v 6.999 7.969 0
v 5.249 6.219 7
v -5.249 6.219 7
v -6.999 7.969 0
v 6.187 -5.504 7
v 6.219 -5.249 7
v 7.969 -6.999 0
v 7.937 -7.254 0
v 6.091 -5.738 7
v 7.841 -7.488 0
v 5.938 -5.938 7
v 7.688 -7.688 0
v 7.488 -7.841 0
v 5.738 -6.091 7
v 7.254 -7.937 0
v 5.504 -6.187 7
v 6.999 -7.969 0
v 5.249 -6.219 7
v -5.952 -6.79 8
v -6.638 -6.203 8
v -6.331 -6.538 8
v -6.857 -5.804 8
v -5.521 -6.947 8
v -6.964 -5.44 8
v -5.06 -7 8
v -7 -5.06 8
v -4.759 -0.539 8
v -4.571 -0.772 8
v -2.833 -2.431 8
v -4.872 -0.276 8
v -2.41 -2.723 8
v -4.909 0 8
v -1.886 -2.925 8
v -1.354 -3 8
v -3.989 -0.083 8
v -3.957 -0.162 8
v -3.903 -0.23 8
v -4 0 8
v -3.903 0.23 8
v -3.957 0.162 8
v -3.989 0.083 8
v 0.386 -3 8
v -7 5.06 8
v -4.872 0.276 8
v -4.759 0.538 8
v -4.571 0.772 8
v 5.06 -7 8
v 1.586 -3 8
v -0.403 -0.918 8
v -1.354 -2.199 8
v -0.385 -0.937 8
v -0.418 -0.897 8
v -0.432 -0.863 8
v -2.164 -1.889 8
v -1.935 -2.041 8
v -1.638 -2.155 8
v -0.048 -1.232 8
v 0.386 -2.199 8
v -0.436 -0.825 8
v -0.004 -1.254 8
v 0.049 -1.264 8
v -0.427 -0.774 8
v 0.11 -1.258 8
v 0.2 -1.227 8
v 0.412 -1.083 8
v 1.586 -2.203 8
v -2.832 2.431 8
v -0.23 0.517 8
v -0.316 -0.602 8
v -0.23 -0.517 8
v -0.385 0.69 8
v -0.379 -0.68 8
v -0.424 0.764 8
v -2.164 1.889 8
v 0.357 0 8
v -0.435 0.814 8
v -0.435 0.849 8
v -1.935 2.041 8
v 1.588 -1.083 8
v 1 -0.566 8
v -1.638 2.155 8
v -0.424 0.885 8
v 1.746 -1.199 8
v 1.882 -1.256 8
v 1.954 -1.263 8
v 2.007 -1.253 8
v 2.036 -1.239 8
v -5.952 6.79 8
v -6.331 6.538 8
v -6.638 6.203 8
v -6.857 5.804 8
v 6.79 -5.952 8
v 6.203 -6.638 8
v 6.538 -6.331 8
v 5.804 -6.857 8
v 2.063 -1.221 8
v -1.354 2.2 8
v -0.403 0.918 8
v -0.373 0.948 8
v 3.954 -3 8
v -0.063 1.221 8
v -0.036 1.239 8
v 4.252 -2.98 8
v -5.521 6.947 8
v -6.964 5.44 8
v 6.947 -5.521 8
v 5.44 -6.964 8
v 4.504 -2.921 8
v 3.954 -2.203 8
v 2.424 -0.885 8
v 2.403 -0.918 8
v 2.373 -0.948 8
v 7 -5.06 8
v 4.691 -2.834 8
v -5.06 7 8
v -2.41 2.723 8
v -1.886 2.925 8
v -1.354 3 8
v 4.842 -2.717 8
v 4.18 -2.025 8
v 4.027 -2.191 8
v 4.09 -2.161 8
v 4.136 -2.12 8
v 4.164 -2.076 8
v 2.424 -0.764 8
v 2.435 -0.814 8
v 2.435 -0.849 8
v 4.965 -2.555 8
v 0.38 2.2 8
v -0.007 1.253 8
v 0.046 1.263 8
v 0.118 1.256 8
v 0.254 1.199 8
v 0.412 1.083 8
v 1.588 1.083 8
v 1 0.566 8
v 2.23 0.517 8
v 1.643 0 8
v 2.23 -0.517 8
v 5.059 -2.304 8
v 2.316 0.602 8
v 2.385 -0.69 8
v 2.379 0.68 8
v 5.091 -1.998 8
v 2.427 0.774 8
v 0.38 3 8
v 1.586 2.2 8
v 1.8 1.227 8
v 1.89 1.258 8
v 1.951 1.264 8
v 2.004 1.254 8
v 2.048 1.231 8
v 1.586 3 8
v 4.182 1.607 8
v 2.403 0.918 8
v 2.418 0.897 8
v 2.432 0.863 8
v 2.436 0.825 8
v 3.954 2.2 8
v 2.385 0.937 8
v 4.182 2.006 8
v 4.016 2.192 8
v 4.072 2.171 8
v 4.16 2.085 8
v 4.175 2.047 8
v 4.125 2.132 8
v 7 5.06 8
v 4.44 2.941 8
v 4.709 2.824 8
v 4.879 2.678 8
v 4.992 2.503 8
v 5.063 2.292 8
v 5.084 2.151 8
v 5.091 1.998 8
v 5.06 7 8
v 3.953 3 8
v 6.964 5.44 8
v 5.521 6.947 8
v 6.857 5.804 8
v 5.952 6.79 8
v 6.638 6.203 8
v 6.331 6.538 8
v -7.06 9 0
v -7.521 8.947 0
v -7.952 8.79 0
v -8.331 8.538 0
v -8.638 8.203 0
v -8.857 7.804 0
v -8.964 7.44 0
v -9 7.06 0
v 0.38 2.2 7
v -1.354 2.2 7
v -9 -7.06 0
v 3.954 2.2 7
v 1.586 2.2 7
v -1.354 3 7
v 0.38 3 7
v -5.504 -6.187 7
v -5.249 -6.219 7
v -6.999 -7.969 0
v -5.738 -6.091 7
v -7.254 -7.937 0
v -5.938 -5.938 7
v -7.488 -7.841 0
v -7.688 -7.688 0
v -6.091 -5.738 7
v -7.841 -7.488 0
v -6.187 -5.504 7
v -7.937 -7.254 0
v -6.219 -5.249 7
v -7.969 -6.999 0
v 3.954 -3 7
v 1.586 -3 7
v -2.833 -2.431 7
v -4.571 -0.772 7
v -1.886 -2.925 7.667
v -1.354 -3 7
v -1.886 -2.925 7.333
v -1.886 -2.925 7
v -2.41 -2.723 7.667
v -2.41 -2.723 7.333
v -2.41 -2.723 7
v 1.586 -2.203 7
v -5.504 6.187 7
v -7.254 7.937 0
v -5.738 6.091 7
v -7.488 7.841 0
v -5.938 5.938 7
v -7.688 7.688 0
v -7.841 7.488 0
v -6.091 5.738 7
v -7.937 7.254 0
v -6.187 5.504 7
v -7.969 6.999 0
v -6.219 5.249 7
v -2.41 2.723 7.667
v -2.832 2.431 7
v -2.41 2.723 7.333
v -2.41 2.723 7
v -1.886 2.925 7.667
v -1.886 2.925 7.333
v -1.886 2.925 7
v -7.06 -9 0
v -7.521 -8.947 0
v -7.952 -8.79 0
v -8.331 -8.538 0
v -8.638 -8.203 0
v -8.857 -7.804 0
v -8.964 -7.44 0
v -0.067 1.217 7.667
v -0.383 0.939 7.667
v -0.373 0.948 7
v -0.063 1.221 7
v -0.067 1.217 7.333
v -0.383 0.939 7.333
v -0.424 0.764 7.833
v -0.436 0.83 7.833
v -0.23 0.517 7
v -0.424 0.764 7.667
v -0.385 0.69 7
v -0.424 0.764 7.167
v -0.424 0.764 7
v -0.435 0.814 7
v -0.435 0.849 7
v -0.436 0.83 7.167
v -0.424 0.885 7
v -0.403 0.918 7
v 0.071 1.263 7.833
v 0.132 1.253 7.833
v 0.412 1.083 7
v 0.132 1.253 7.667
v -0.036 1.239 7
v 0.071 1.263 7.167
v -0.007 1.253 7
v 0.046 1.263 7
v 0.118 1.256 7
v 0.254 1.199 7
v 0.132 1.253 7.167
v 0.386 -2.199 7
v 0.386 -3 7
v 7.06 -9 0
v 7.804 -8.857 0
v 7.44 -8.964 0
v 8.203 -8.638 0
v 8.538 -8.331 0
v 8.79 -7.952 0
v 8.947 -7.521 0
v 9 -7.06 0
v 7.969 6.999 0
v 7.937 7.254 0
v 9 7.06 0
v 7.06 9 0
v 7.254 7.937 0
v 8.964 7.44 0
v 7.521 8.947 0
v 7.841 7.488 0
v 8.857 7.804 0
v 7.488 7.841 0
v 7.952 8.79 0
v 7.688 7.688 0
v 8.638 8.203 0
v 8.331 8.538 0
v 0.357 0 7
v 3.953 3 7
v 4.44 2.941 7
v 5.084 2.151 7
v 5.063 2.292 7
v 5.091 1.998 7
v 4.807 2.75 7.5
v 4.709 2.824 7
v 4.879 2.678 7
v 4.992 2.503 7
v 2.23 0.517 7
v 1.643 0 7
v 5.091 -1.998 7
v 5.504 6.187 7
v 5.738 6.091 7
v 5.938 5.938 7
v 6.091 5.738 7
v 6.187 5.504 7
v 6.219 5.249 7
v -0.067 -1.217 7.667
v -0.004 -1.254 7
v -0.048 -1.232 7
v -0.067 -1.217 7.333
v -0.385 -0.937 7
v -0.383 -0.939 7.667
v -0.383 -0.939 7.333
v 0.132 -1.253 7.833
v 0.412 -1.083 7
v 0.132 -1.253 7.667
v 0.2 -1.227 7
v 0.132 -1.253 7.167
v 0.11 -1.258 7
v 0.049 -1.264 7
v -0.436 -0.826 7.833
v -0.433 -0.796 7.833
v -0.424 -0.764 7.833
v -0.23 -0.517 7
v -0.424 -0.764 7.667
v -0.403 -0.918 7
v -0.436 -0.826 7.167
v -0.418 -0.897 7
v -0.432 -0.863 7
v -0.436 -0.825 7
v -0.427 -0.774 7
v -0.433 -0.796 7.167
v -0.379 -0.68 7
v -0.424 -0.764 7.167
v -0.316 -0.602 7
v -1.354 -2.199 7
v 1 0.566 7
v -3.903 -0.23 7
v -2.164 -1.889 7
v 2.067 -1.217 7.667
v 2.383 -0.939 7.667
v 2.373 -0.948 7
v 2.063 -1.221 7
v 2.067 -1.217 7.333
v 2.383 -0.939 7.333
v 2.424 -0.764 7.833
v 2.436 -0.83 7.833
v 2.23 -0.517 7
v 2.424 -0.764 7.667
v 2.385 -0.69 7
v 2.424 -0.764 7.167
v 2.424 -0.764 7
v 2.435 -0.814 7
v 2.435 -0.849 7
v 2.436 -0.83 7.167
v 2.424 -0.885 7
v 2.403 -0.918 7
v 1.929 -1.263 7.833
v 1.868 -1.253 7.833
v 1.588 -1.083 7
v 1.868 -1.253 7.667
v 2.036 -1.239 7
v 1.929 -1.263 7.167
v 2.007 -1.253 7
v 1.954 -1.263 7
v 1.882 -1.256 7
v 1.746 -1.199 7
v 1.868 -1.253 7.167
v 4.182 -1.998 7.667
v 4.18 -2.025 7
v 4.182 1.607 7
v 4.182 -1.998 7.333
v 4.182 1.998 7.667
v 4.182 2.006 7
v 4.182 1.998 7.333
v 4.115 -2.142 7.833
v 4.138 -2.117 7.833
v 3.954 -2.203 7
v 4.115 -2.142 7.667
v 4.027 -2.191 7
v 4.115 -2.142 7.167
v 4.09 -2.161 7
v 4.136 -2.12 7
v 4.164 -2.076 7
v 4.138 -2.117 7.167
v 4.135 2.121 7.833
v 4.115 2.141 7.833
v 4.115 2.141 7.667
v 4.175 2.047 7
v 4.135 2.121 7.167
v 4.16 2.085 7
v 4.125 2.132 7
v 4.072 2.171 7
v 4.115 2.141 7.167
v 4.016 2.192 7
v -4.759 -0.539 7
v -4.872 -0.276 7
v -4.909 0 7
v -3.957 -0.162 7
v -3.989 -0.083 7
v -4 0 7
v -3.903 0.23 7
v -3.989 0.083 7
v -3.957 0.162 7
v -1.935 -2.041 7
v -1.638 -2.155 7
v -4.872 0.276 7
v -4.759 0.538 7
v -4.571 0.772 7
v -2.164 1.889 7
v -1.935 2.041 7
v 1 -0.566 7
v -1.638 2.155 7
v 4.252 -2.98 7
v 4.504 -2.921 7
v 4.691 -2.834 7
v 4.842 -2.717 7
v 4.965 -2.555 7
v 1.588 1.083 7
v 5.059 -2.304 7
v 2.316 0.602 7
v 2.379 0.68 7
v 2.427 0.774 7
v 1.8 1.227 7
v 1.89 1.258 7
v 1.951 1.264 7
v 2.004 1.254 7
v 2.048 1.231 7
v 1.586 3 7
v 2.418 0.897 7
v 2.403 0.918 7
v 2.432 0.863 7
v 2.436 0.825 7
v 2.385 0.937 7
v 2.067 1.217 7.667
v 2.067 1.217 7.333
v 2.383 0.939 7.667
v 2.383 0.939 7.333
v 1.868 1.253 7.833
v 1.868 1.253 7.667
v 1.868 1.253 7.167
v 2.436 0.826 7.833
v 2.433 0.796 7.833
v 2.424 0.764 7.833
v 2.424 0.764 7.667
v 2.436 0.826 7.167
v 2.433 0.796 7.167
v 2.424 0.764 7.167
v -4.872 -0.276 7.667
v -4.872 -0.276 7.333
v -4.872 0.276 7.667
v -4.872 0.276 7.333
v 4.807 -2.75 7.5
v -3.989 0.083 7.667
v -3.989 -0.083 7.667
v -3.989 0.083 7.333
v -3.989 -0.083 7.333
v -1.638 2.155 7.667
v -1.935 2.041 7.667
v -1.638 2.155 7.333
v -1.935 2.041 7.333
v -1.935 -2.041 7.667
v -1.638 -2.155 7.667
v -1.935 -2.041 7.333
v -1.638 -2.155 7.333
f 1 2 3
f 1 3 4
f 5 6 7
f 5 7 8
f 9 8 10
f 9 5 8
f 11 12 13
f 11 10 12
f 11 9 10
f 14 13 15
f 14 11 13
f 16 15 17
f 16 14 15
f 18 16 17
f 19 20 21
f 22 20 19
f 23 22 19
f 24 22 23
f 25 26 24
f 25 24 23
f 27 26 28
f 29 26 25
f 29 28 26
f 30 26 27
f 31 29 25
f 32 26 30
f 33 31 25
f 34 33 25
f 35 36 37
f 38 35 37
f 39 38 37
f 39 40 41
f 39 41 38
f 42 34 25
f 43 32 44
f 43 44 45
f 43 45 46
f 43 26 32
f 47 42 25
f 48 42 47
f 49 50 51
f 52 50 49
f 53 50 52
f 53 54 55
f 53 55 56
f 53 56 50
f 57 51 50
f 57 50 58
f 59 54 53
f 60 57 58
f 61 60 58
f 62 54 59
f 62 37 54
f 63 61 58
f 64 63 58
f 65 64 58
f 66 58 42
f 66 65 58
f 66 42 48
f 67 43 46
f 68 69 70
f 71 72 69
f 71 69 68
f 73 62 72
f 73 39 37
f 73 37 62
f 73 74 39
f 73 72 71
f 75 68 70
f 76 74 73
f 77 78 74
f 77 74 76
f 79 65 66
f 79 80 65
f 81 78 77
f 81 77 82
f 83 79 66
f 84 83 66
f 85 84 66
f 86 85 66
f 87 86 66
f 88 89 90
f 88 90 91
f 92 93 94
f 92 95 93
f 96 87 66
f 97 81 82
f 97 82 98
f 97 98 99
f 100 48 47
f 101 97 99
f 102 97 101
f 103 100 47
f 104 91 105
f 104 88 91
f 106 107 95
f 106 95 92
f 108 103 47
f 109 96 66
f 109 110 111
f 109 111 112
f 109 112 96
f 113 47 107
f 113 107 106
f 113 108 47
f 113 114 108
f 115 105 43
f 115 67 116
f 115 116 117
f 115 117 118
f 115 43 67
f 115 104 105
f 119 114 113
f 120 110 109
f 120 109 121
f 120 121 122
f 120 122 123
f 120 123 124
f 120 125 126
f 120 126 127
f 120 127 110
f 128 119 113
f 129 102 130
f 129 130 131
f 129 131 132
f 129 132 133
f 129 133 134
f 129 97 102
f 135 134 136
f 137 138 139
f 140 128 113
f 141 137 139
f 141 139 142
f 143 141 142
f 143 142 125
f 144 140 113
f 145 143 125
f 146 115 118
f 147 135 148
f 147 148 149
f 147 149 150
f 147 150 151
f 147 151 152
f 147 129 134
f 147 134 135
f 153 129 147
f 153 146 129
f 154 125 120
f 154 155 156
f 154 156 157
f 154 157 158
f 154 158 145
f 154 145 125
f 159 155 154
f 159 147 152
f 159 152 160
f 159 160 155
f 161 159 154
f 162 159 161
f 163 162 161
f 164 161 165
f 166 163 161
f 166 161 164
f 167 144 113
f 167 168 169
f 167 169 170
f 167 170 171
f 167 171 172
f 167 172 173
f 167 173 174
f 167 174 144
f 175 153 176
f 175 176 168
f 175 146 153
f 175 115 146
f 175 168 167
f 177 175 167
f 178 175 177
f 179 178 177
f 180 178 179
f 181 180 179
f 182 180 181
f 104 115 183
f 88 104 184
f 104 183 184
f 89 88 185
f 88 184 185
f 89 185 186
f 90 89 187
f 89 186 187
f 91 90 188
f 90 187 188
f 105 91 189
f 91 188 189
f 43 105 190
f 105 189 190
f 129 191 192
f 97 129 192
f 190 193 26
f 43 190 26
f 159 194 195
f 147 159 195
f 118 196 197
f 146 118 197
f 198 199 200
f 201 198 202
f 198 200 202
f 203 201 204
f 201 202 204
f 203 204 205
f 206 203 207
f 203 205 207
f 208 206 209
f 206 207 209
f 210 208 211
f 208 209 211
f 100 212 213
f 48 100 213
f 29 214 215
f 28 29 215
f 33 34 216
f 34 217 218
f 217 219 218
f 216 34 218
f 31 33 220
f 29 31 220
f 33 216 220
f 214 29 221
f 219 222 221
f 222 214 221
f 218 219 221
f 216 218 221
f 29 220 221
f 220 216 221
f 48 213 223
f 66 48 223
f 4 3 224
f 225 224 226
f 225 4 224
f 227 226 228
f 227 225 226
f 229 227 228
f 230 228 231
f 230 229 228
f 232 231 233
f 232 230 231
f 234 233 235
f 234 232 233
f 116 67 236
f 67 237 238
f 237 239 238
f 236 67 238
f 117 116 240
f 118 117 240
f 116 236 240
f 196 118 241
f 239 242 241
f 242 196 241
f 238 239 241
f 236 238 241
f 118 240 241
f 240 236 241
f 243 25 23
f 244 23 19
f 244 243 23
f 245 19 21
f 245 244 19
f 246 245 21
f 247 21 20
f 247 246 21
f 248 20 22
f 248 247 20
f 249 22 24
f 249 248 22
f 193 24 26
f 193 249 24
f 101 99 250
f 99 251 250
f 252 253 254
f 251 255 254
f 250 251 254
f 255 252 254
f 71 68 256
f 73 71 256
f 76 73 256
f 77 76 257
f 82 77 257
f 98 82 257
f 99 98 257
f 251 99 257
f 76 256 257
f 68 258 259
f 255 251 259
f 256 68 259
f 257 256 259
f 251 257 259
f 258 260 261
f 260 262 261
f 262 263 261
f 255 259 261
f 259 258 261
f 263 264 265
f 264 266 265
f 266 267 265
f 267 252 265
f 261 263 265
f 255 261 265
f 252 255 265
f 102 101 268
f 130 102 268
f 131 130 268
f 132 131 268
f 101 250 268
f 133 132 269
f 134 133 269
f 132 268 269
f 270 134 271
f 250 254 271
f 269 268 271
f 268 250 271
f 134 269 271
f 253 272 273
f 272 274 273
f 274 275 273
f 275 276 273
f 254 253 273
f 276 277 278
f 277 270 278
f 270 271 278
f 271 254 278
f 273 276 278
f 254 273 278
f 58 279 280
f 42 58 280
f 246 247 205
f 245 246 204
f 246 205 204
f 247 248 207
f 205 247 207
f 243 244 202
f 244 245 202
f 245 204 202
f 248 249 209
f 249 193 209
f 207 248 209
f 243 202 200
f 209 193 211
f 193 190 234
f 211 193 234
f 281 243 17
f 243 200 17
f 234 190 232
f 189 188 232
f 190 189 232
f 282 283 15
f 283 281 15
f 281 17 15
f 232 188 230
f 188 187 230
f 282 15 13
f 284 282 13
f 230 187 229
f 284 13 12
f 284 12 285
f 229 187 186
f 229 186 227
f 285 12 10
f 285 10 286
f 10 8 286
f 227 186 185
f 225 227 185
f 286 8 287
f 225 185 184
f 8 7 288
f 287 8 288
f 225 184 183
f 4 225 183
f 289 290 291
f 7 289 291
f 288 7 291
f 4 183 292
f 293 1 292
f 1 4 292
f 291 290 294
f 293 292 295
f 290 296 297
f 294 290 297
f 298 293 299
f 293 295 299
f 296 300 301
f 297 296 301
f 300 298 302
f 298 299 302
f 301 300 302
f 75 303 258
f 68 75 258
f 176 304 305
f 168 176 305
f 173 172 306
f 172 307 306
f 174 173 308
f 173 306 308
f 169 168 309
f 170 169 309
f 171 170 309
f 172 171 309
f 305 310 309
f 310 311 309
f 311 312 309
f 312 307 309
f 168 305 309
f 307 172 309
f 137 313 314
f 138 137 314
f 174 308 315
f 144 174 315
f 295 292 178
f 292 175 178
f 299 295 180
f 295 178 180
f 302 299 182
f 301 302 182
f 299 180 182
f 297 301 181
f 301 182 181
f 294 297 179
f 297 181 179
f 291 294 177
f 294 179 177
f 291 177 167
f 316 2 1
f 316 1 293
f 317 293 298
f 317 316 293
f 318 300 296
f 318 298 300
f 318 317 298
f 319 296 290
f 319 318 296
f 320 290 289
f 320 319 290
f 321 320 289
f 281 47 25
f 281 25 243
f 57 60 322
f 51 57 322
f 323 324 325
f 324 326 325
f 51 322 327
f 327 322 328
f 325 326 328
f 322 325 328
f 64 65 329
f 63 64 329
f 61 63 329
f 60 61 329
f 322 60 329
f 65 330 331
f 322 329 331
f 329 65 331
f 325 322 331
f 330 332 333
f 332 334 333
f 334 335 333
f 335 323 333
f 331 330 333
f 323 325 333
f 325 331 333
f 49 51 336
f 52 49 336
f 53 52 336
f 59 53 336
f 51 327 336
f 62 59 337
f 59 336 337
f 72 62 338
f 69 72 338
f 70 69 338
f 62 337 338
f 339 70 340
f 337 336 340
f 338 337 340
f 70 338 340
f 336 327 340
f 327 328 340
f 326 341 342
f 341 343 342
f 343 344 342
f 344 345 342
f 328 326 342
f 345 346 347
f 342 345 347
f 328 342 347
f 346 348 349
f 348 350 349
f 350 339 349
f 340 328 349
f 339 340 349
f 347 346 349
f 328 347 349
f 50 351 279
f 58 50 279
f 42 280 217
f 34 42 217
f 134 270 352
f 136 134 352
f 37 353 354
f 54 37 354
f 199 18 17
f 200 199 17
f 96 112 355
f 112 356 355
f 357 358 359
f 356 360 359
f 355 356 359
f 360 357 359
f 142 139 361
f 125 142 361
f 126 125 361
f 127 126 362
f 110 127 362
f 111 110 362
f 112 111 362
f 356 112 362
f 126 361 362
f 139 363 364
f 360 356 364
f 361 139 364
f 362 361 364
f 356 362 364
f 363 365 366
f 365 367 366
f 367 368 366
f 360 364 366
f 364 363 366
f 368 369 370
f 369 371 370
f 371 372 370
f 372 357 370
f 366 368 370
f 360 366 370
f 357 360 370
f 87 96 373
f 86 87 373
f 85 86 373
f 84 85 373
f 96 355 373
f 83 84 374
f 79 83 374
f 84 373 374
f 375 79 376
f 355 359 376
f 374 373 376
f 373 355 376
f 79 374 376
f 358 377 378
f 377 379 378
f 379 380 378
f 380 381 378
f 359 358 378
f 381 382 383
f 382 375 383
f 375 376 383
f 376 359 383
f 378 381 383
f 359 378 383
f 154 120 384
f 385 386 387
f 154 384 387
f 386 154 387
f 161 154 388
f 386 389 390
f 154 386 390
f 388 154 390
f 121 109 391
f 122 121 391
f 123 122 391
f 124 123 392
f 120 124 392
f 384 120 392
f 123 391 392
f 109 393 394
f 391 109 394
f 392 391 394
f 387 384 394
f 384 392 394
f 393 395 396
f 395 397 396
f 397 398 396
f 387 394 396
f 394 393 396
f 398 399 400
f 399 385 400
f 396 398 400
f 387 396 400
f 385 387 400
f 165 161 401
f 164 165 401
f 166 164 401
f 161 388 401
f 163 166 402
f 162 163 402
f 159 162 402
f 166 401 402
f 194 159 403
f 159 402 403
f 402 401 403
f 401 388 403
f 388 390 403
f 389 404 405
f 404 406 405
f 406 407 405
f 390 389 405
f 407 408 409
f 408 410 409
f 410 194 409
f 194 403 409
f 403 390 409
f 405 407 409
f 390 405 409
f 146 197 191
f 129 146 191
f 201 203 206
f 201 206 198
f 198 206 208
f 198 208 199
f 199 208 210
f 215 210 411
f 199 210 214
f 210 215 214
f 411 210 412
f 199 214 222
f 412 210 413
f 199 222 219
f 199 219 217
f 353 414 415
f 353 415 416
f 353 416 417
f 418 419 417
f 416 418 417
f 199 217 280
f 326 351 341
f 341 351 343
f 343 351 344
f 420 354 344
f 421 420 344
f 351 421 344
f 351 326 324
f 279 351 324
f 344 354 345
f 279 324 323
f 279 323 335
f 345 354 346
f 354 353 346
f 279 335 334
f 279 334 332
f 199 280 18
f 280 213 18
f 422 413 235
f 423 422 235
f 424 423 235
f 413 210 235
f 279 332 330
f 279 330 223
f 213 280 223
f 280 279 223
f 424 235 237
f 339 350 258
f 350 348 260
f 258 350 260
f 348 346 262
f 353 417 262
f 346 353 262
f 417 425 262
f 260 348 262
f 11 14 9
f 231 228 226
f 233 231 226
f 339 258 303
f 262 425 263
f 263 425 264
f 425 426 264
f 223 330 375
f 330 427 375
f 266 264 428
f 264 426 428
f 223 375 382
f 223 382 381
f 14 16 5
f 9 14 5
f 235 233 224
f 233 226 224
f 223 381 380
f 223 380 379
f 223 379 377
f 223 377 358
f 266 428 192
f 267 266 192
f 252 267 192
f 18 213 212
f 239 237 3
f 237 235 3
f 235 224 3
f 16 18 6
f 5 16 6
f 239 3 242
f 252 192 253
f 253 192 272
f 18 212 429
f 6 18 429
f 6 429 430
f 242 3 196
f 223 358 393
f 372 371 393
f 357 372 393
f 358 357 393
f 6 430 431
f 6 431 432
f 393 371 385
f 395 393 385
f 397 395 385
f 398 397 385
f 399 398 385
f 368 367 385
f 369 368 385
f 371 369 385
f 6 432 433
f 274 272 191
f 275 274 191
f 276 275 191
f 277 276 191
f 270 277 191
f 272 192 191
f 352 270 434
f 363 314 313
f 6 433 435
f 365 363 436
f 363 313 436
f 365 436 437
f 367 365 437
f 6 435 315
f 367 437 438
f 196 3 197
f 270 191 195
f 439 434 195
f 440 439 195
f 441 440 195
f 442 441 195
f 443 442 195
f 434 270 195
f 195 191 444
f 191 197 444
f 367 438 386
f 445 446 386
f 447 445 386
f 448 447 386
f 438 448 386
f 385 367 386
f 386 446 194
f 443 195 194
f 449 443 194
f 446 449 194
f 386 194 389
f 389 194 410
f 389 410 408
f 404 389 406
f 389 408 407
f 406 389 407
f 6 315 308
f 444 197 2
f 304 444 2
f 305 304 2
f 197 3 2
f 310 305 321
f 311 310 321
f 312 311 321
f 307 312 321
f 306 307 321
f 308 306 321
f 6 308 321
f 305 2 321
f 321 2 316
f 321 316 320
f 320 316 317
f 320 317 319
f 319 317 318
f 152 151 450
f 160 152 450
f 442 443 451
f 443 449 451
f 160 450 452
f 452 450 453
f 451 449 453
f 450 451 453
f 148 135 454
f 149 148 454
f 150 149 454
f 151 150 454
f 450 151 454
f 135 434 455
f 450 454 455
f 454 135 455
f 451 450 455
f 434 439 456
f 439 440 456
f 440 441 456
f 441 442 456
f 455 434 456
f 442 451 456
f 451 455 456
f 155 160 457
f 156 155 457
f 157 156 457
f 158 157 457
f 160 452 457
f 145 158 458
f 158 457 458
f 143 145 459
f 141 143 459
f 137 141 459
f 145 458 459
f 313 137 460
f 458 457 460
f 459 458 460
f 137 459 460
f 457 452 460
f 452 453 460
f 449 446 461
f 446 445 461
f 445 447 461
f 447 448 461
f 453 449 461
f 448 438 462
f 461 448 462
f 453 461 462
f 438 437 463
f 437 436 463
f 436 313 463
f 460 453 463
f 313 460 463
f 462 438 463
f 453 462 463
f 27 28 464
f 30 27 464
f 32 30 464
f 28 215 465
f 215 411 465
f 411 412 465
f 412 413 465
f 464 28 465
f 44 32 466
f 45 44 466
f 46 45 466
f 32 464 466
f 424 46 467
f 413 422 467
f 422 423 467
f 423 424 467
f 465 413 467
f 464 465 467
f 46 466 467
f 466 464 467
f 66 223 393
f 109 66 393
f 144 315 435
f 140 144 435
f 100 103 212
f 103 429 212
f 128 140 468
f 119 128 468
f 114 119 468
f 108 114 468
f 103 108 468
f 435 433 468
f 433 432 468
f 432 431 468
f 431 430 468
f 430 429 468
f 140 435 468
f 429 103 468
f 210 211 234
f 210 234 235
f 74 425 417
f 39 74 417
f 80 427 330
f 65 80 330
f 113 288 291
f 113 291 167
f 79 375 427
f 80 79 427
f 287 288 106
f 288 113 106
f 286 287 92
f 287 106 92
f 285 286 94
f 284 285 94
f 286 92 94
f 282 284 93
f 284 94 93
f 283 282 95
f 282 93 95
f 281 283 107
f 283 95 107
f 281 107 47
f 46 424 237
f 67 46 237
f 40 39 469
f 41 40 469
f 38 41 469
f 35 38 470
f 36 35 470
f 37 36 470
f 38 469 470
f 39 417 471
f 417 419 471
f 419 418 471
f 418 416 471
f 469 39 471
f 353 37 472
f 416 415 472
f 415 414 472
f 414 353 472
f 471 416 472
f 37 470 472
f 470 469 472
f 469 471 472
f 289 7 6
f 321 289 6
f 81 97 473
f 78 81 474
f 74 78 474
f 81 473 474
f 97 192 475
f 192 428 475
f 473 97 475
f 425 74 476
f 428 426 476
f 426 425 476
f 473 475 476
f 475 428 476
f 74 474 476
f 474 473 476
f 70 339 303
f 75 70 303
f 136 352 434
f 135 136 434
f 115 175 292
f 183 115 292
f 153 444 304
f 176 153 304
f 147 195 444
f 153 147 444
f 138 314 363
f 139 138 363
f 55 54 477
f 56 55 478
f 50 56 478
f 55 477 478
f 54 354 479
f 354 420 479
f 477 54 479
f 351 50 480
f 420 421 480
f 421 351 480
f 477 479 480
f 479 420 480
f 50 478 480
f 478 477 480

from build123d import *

# Parameters (mm, degrees)
EXTRUDE_DEPTH        = 1
SKETCH_W             = 18
SKETCH_H             = 18
PAD_DEPTH            = 8
POCKET_DEPTH         = 18.001
POCKET001_DEPTH      = 9.001
POCKET001_DEPTH_BACK = 9.001
FILLET_R             = 2
THICKNESS_T          = -1


with BuildPart() as extrude_body:
    # Sketch003 → Extrude (new body)
    with BuildSketch(Plane.XY):
        with BuildLine():
            add(Edge.make_bspline(
                [(0, 0.5656), (0.587711, 1.0828)],
                knots=[0, 0, 1, 1], degree=1))
            add(Edge.make_bspline(
                [(0.587711, 1.0828), (0.909016, 1.35583), (1.22484, 1.07789), (1.54067, 0.799956), (1.23042, 0.517199)],
                knots=[0, 0, 0, 0.333333, 0.666667, 1, 1, 1], degree=2))
            add(Edge.make_bspline(
                [(1.23042, 0.517199), (0.642707, 0)],
                knots=[0, 0, 1, 1], degree=1))
            add(Edge.make_bspline(
                [(0.642707, 0), (1.23042, -0.517202)],
                knots=[0, 0, 1, 1], degree=1))
            add(Edge.make_bspline(
                [(1.23042, -0.517202), (1.54067, -0.799959), (1.22484, -1.0779), (0.909016, -1.35583), (0.587711, -1.0828)],
                knots=[0, 0, 0, 0.333333, 0.666667, 1, 1, 1], degree=2))
            add(Edge.make_bspline(
                [(0.587711, -1.0828), (0, -0.5656)],
                knots=[0, 0, 1, 1], degree=1))
            add(Edge.make_bspline(
                [(0, -0.5656), (-0.587708, -1.0828)],
                knots=[0, 0, 1, 1], degree=1))
            add(Edge.make_bspline(
                [(-0.587708, -1.0828), (-0.909014, -1.3559), (-1.22488, -1.07793), (-1.54074, -0.79996), (-1.23042, -0.517202)],
                knots=[0, 0, 0, 0.333333, 0.666667, 1, 1, 1], degree=2))
            add(Edge.make_bspline(
                [(-1.23042, -0.517202), (-0.642707, 0)],
                knots=[0, 0, 1, 1], degree=1))
            add(Edge.make_bspline(
                [(-0.642707, 0), (-1.23042, 0.517199)],
                knots=[0, 0, 1, 1], degree=1))
            add(Edge.make_bspline(
                [(-1.23042, 0.517199), (-1.54074, 0.799958), (-1.22488, 1.07793), (-0.909014, 1.3559), (-0.587708, 1.0828)],
                knots=[0, 0, 0, 0.333333, 0.666667, 1, 1, 1], degree=2))
            add(Edge.make_bspline(
                [(-0.587708, 1.0828), (0, 0.5656)],
                knots=[0, 0, 1, 1], degree=1))
        make_face()
        with BuildLine():
            Line((-0.613575, -3), (-2.35447, -3))
            add(Edge.make_bspline(
                [(-2.35447, -3), (-2.85946, -3), (-3.49148, -2.7568), (-3.83261, -2.4312)],
                knots=[0, 0, 0, 0, 1, 1, 1, 1], degree=3))
            add(Edge.make_bspline(
                [(-3.83261, -2.4312), (-5.57096, -0.772401)],
                knots=[0, 0, 1, 1], degree=1))
            add(Edge.make_bspline(
                [(-5.57096, -0.772401), (-6.02186, -0.3424), (-6.02208, 0.341998), (-5.57096, 0.772398)],
                knots=[0, 0, 0, 0, 1, 1, 1, 1], degree=3))
            add(Edge.make_bspline(
                [(-5.57096, 0.772398), (-3.83238, 2.4312)],
                knots=[0, 0, 1, 1], degree=1))
            add(Edge.make_bspline(
                [(-3.83238, 2.4312), (-3.49216, 2.756), (-2.85809, 3), (-2.35447, 3)],
                knots=[0, 0, 0, 0, 1, 1, 1, 1], degree=3))
            Line((-2.35447, 3), (-0.619992, 3))
            Line((-0.619992, 3), (-0.619992, 2.2))
            Line((-0.619992, 2.2), (-2.35447, 2.2))
            add(Edge.make_bspline(
                [(-2.35447, 2.2), (-2.60446, 2.2), (-2.99604, 2.0494), (-3.16422, 1.8888)],
                knots=[0, 0, 0, 0, 1, 1, 1, 1], degree=3))
            add(Edge.make_bspline(
                [(-3.16422, 1.8888), (-4.9028, 0.230198)],
                knots=[0, 0, 1, 1], degree=1))
            add(Edge.make_bspline(
                [(-4.9028, 0.230198), (-5.03257, 0.106198), (-5.03234, -0.106201), (-4.9028, -0.230201)],
                knots=[0, 0, 0, 0, 1, 1, 1, 1], degree=3))
            add(Edge.make_bspline(
                [(-4.9028, -0.230201), (-3.16422, -1.8888)],
                knots=[0, 0, 1, 1], degree=1))
            add(Edge.make_bspline(
                [(-3.16422, -1.8888), (-2.99536, -2.05), (-2.6056, -2.2), (-2.35447, -2.198788)],
                knots=[0, 0, 0, 0, 1, 1, 1, 1], degree=3))
            Line((-2.35447, -2.198788), (-0.613575, -2.198788))
            Line((-0.613575, -2.198788), (-0.613575, -3))
        make_face()
        with BuildLine():
            add(Edge.make_bspline(
                [(2.95332, 3), (4.09261, 3.001), (4.09078, 1.9984)],
                knots=[0, 0, 0, 1, 1, 1], degree=2))
            add(Edge.make_bspline(
                [(4.09078, 1.9984), (4.09078, -1.9984)],
                knots=[0, 0, 1, 1], degree=1))
            add(Edge.make_bspline(
                [(4.09078, -1.9984), (4.09169, -3), (2.95354, -3)],
                knots=[0, 0, 0, 1, 1, 1], degree=2))
            Line((2.95354, -3), (0.585592, -3))
            Line((0.585592, -3), (0.585592, -2.20349))
            Line((0.585592, -2.20349), (2.95354, -2.20349))
            add(Edge.make_bspline(
                [(2.95354, -2.20349), (3.07945, -2.2), (3.18172, -2.1102), (3.18172, -1.9984)],
                knots=[0, 0, 0, 0, 1, 1, 1, 1], degree=3))
            add(Edge.make_bspline(
                [(3.18172, -1.9984), (3.18172, 1.9984)],
                knots=[0, 0, 1, 1], degree=1))
            add(Edge.make_bspline(
                [(3.18172, 1.9984), (3.18172, 2.1104), (3.08036, 2.2), (2.95354, 2.2)],
                knots=[0, 0, 0, 0, 1, 1, 1, 1], degree=3))
            Line((2.95354, 2.2), (0.586243, 2.2))
            Line((0.586243, 2.2), (0.586243, 3))
            Line((0.586243, 3), (2.95332, 3))
        make_face()
    extrude(amount=EXTRUDE_DEPTH)


with BuildPart() as extrude_body_1:
    # Extrude placement: moved
    add(extrude_body.part.moved(Location((1, 0, 7))))


with BuildPart() as cut:
    # Sketch → Pad (new body)
    with BuildSketch(Plane.XY):
        Rectangle(SKETCH_W, SKETCH_H)
    extrude(amount=PAD_DEPTH)

    # Sketch001 (on Face1 of Pad) → Pocket (cut, through all)
    with BuildSketch(Plane.XZ.offset(9)):
        Polygon((-9, 8), (-9, 0), (-7, 8), align=None)
        Polygon((9, 8), (9, 0), (7, 8), align=None)
    extrude(amount=-POCKET_DEPTH, mode=Mode.SUBTRACT)

    # Sketch002 → Pocket001 (cut, two sides)
    with BuildSketch(Plane.YZ) as pocket001_sk:
        Polygon((-9, 8), (-7, 8), (-9, 0), align=None)
        Polygon((9, 8), (7, 8), (9, 0), align=None)
    extrude(amount=-POCKET001_DEPTH, mode=Mode.SUBTRACT)
    extrude(pocket001_sk.sketch, amount=POCKET001_DEPTH_BACK, mode=Mode.SUBTRACT)

    # Fillet
    fillet_edges = [cut.edges().sort_by_distance(p)[0] for p in [
        (-8, 8, 4),
        (-8, -8, 4),
        (8, -8, 4),
        (8, 8, 4),
    ]]
    fillet(fillet_edges, radius=FILLET_R)

    # Thickness
    thickness_openings = [cut.faces().sort_by_distance(p)[0] for p in [
        (0, 0, 0),
    ]]
    offset(amount=THICKNESS_T, openings=thickness_openings, kind=Kind.INTERSECTION)

    # Cut: cut Extrude body
    add(extrude_body_1.part, mode=Mode.SUBTRACT)


solid = cut.part
